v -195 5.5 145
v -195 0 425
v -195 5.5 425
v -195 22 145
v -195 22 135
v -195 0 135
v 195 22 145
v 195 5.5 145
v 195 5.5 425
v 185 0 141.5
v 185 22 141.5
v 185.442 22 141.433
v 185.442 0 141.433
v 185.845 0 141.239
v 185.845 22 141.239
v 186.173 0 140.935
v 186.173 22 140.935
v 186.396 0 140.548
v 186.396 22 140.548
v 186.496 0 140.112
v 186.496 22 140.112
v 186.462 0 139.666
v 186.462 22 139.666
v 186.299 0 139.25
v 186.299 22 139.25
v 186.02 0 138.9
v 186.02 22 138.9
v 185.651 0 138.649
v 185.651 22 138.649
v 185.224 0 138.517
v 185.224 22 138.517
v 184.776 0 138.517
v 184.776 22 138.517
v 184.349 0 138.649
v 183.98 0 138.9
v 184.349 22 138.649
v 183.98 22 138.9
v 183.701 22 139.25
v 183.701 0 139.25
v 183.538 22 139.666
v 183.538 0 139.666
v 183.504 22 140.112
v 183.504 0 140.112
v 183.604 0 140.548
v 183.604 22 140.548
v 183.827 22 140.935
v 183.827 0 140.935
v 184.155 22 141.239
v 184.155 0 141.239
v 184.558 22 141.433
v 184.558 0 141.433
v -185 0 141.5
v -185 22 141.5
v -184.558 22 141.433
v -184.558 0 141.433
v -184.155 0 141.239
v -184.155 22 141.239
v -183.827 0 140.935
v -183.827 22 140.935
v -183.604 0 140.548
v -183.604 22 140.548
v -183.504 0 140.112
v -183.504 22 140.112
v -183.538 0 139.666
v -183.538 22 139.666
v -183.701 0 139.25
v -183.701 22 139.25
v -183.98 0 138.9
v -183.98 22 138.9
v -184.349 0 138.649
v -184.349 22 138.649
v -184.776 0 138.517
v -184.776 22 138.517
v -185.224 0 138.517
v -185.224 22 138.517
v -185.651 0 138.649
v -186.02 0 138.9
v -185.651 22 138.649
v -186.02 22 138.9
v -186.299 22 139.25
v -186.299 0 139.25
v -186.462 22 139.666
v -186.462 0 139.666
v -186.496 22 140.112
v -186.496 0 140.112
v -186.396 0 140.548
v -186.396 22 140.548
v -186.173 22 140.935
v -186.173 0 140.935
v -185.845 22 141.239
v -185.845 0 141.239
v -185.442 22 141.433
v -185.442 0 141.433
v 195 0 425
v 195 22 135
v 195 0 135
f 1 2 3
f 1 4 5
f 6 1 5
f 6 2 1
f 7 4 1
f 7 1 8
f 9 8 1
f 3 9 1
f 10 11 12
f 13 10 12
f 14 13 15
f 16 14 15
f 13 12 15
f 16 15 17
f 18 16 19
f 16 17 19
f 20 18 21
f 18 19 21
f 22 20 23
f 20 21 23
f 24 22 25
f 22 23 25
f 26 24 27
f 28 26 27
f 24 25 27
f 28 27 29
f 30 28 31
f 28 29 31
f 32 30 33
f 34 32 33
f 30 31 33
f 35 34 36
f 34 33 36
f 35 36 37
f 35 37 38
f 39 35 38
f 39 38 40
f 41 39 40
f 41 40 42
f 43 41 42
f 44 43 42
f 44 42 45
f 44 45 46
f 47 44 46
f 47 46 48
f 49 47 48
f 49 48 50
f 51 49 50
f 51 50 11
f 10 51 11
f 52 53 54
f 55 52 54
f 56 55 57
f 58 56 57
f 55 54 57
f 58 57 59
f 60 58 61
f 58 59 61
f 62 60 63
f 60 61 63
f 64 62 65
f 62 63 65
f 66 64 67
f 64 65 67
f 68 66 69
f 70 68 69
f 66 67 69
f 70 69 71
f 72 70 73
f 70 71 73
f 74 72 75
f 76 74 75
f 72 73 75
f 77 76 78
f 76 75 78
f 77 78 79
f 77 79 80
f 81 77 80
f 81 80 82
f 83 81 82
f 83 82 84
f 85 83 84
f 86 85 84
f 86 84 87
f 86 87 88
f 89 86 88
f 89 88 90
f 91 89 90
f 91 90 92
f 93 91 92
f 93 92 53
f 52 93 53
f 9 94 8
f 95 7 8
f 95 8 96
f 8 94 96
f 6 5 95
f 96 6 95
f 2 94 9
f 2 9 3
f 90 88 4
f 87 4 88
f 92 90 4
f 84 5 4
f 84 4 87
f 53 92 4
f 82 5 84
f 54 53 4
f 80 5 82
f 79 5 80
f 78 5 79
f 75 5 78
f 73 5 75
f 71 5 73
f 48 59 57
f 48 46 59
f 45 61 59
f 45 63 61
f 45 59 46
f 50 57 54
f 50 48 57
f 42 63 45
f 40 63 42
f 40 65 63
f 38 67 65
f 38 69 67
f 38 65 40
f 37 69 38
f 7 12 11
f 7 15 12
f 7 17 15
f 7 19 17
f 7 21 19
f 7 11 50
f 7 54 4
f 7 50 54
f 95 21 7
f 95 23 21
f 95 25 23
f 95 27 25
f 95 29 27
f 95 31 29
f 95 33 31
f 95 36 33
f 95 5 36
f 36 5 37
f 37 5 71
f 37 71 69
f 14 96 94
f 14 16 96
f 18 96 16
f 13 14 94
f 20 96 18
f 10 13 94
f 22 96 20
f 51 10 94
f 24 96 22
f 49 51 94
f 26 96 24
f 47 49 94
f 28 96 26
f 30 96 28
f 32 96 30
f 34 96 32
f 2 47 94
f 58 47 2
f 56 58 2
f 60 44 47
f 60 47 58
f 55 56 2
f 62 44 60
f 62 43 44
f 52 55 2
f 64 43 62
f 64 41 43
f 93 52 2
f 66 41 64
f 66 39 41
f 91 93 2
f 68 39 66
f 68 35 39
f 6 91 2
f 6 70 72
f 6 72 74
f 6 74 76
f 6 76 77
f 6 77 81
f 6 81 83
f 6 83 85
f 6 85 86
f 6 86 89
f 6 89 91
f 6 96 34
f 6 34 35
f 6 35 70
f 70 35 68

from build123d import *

# Parameters (mm, degrees)
CROQUIS2_W                 = 390
CROQUIS2_H                 = 290
SALIENTE_EXTRUIR2_DEPTH    = 10
CROQUIS3_W                 = 390
CROQUIS3_H                 = 7
SALIENTE_EXTRUIR3_DEPTH    = 25
SALIENTE_EXTRUIR4_DEPTH    = 390
CORTAR_EXTRUIR1_DEPTH      = 180
CORTAR_EXTRUIR2_DEPTH      = 180
SALIENTE_EXTRUIR5_DEPTH    = 179
CROQUIS10_W                = 283
CROQUIS10_H                = 194.109962813
CORTAR_EXTRUIR5_DEPTH      = 236
CORTAR_EXTRUIR6_DEPTH      = 236
SALIENTE_EXTRUIR6_DEPTH    = 236
CROQUIS13_W                = 339.798946509
CROQUIS13_H                = 236.819651801
CROQUIS13_W_2              = 44.776464784
CROQUIS13_H_2              = 75.104657821
CORTAR_EXTRUIR7_DEPTH      = 500
CROQUIS14_W                = 59.446000687
CROQUIS14_H                = 81.435889979
CORTAR_EXTRUIR8_DEPTH      = 500
CROQUIS15_W                = 50
CROQUIS15_H                = 5
CORTAR_EXTRUIR9_DEPTH      = 500
CROQUIS16_W                = 390
CROQUIS16_H                = 283
CORTAR_EXTRUIR10_DEPTH     = 10
CROQUIS17_R                = 3.75
CORTAR_EXTRUIR11_DEPTH     = 10
CROQUIS18_R                = 3.75
CROQUIS18_R_2              = 1.5
SALIENTE_EXTRUIR8_DEPTH    = 4
CROQUIS19_R                = 1.5
SALIENTE_EXTRUIR10_DEPTH   = 15
CROQUIS20_R                = 1.5
SALIENTE_EXTRUIR11_DEPTH   = 15
SALIENTE_EXTRUIR11_2_DEPTH = 15
SALIENTE_EXTRUIR11_3_DEPTH = 15
CROQUIS21_W                = 390
CROQUIS21_H                = 283
SALIENTE_EXTRUIR12_DEPTH   = 10
CORTAR_EXTRUIR12_START     = -47
CROQUIS22_R                = 1.5
CORTAR_EXTRUIR12_DEPTH     = 47
CROQUIS26_W                = 283
CROQUIS26_H                = 4.5
CORTAR_EXTRUIR16_DEPTH     = 500
CROQUIS27_W                = 7
CROQUIS27_H                = 9.5
CORTAR_EXTRUIR17_DEPTH     = 500
CORTAR_EXTRUIR18_DEPTH     = 500
CROQUIS29_R                = 3.5
CORTAR_EXTRUIR19_DEPTH     = 20
CORTAR_EXTRUIR20_DEPTH     = 314
CROQUIS32_R                = 3.5
CORTAR_EXTRUIR21_DEPTH     = 25
CROQUIS33_W                = 308.833685193
CROQUIS33_H                = 37.038834889
CORTAR_EXTRUIR22_DEPTH     = 500
CROQUIS34_W                = 390
CROQUIS34_H                = 290
CROQUIS34_R                = 1.5
SALIENTE_EXTRUIR14_DEPTH   = 5.5
CROQUIS35_W                = 390
CROQUIS35_H                = 10
SALIENTE_EXTRUIR15_DEPTH   = 22
CORTAR_EXTRUIR23_DEPTH     = 488
CORTAR_EXTRUIR28_DEPTH     = 479.5
CROQUIS38_R                = 3.5
CORTAR_EXTRUIR29_DEPTH     = 25
CROQUIS39_R                = 1.5
SALIENTE_EXTRUIR16_DEPTH   = 9
CROQUIS40_R                = 3.5
SALIENTE_EXTRUIR17_DEPTH   = 25
CROQUIS41_R                = 3.5
CORTAR_EXTRUIR30_DEPTH     = 25
CROQUIS43_W                = 307.128340428
CROQUIS43_H                = 102.232085181
CORTAR_EXTRUIR32_DEPTH     = 500
CROQUIS44_R                = 1.5
CORTAR_EXTRUIR34_DEPTH     = 50
CROQUIS45_W                = 390
CROQUIS45_H                = 290
CORTAR_EXTRUIR37_DEPTH     = 50
SALIENTE_EXTRUIR19_START   = 16.5
CROQUIS46_W                = 390
CROQUIS46_H                = 10
CROQUIS46_R                = 1.5
SALIENTE_EXTRUIR19_DEPTH   = 16.5
CROQUIS48_W                = 390
CROQUIS48_H                = 280
CORTAR_EXTRUIR38_DEPTH     = 16.5
CROQUIS49_W                = 390
CROQUIS49_H                = 280
SALIENTE_EXTRUIR20_DEPTH   = 5.5


with BuildPart() as part:
    # Croquis2 → Saliente-Extruir2 (new body)
    with BuildSketch(Plane(origin=(0, 0, 0), x_dir=(1, 0, 0), z_dir=(0, 1, 0))):
        Rectangle(CROQUIS2_W, CROQUIS2_H)
    extrude(amount=SALIENTE_EXTRUIR2_DEPTH)

    # Croquis3 → Saliente-Extruir3 (add)
    with BuildSketch(Plane(origin=(0, 10, 0), x_dir=(1, 0, 0), z_dir=(0, 1, 0))):
        with Locations((0, -141.5)):
            Rectangle(CROQUIS3_W, CROQUIS3_H)
    extrude(amount=SALIENTE_EXTRUIR3_DEPTH)

    # Croquis5 → Saliente-Extruir4 (add)
    with BuildSketch(Plane.ZY.offset(195)):
        Polygon((145, 0), (51.120689647, -135.689627782), (-145, 0), align=None)
    extrude(amount=-SALIENTE_EXTRUIR4_DEPTH)

    # Croquis6 → Cortar-Extruir1 (cut)
    with BuildSketch(Plane.ZY.offset(195)):
        Polygon((-145, 0), (145, 0), (51.120689647, -135.689627782), align=None)
    extrude(amount=-CORTAR_EXTRUIR1_DEPTH, mode=Mode.SUBTRACT)

    # Croquis7 → Cortar-Extruir2 (cut)
    with BuildSketch(Plane(origin=(195, 0, 0), x_dir=(0, 0, -1), z_dir=(1, 0, 0))):
        Polygon((145, 0), (-145, 0), (-51.120689647, -135.689627782), align=None)
    extrude(amount=-CORTAR_EXTRUIR2_DEPTH, mode=Mode.SUBTRACT)

    # Croquis8 → Saliente-Extruir5 (add)
    with BuildSketch(Plane(origin=(0, -67.844813894, -46.939655172), x_dir=(-1, 0, 0), z_dir=(0, -0.8223613805318496, -0.5689655172413796))):
        Polygon((15, -119.242400168), (105, 119.242400177), (75, 119.242400177), (15, -39.747466719), align=None)
    extrude(amount=-SALIENTE_EXTRUIR5_DEPTH)

    # Croquis10 → Cortar-Extruir5 (cut)
    with BuildSketch(Plane.ZY.offset(195)):
        with Locations((-3.5, 107.054981407)):
            Rectangle(CROQUIS10_W, CROQUIS10_H)
    extrude(amount=-CORTAR_EXTRUIR5_DEPTH, mode=Mode.SUBTRACT)

    # Croquis11 → Cortar-Extruir6 (cut)
    with BuildSketch(Plane.ZY.offset(195)):
        Polygon((145, 17.024145748), (144.999999988, 0), (165.789590248, 1.603195777), (161.358166331, 19.30887792), align=None)
    extrude(amount=-CORTAR_EXTRUIR6_DEPTH, mode=Mode.SUBTRACT)

    # Croquis12 → Saliente-Extruir6 (add)
    with BuildSketch(Plane(origin=(0, -67.844813894, -46.939655172), x_dir=(-1, 0, 0), z_dir=(0, -0.8223613805318496, -0.5689655172413796))):
        Polygon((-15, -119.242400168), (-105, 119.242400177), (-75, 119.242400177), (-15, -39.747466719), align=None)
    extrude(amount=-SALIENTE_EXTRUIR6_DEPTH)

    # Croquis13 → Cortar-Extruir7 (cut)
    with BuildSketch(Plane(origin=(195, 0, 0), x_dir=(0, 0, -1), z_dir=(1, 0, 0))):
        with Locations((31.899473255, 128.409825901)):
            Rectangle(CROQUIS13_W, CROQUIS13_H)
        with Locations((-167.388232392, 37.552328911)):
            Rectangle(CROQUIS13_W_2, CROQUIS13_H_2)
    extrude(amount=-CORTAR_EXTRUIR7_DEPTH, mode=Mode.SUBTRACT)

    # Croquis14 → Cortar-Extruir8 (cut)
    with BuildSketch(Plane(origin=(195, 0, 0), x_dir=(0, 0, -1), z_dir=(1, 0, 0))):
        with Locations((-167.723000344, 75.71794499)):
            Rectangle(CROQUIS14_W, CROQUIS14_H)
    extrude(amount=-CORTAR_EXTRUIR8_DEPTH, mode=Mode.SUBTRACT)

    # Croquis15 → Cortar-Extruir9 (cut)
    with BuildSketch(Plane.ZY.offset(195)):
        with Locations((-102, -2.5)):
            Rectangle(CROQUIS15_W, CROQUIS15_H)
    extrude(amount=-CORTAR_EXTRUIR9_DEPTH, mode=Mode.SUBTRACT)

    # Croquis16 → Cortar-Extruir10 (cut)
    with BuildSketch(Plane(origin=(0, 10, 0), x_dir=(1, 0, 0), z_dir=(0, 1, 0))):
        with Locations((0, 3.5)):
            Rectangle(CROQUIS16_W, CROQUIS16_H)
    extrude(amount=-CORTAR_EXTRUIR10_DEPTH, mode=Mode.SUBTRACT)

    # Croquis17 → Cortar-Extruir11 (cut)
    with BuildSketch(Plane(origin=(0, 0, 0), x_dir=(1, 0, 0), z_dir=(0, 1, 0))):
        with Locations(Location((-87.205, 136, 0), (0, 0, 270))):
            Circle(CROQUIS17_R)
        with Locations(Location((0, 136, 0), (0, 0, 270))):
            Circle(CROQUIS17_R)
        with Locations(Location((87.205, 136, 0), (0, 0, 270))):
            Circle(CROQUIS17_R)
    extrude(amount=-CORTAR_EXTRUIR11_DEPTH, mode=Mode.SUBTRACT)

    # Croquis18 → Saliente-Extruir8 (add)
    # profile 1 of 3: a face of its own
    with BuildSketch(Plane(origin=(0, 0, 0), x_dir=(1, 0, 0), z_dir=(0, 1, 0))):
        with Locations((-87.205, 136)):
            Circle(CROQUIS18_R)
        with Locations(Location((-87.205, 136, 0), (0, 0, 270))):
            Circle(CROQUIS18_R_2, mode=Mode.SUBTRACT)
    # profile 2 of 3: a face of its own
    with BuildSketch(Plane(origin=(0, 0, 0), x_dir=(1, 0, 0), z_dir=(0, 1, 0))):
        with Locations((0, 136)):
            Circle(CROQUIS18_R)
        with Locations(Location((0, 136, 0), (0, 0, 270))):
            Circle(CROQUIS18_R_2, mode=Mode.SUBTRACT)
    # profile 3 of 3: a face of its own
    with BuildSketch(Plane(origin=(0, 0, 0), x_dir=(1, 0, 0), z_dir=(0, 1, 0))):
        with Locations((87.205, 136)):
            Circle(CROQUIS18_R)
        with Locations(Location((87.205, 136, 0), (0, 0, 270))):
            Circle(CROQUIS18_R_2, mode=Mode.SUBTRACT)
    extrude(amount=-SALIENTE_EXTRUIR8_DEPTH)

    # Croquis19 → Saliente-Extruir10 (add)
    with BuildSketch(Plane(origin=(0, 0, 0), x_dir=(1, 0, 0), z_dir=(0, 1, 0))):
        with Locations(Location((-52.533337706, 22, 0), (0, 0, 270))):
            Circle(CROQUIS19_R)
        with Locations(Location((0, 22, 0), (0, 0, 270))):
            Circle(CROQUIS19_R)
        with Locations(Location((52.533337706, 22, 0), (0, 0, 270))):
            Circle(CROQUIS19_R)
        with Locations(Location((0, -58, 0), (0, 0, 270))):
            Circle(CROQUIS19_R)
        with Locations(Location((0, -116, 0), (0, 0, 270))):
            Circle(CROQUIS19_R)
    extrude(amount=SALIENTE_EXTRUIR10_DEPTH)



with BuildPart() as body_2:
    # Croquis20 → Saliente-Extruir11 (new body)
    with BuildSketch(Plane(origin=(0, 0, 0), x_dir=(1, 0, 0), z_dir=(0, 1, 0))):
        with Locations(Location((-87.205, 136, 0), (0, 0, 270))):
            Circle(CROQUIS20_R)
    extrude(amount=SALIENTE_EXTRUIR11_DEPTH)


with BuildPart() as body_3:
    # Croquis20 → Saliente-Extruir11 2 (new body)
    with BuildSketch(Plane(origin=(0, 0, 0), x_dir=(1, 0, 0), z_dir=(0, 1, 0))):
        with Locations(Location((0, 136, 0), (0, 0, 270))):
            Circle(CROQUIS20_R)
    extrude(amount=SALIENTE_EXTRUIR11_2_DEPTH)


with BuildPart() as body_4:
    # Croquis20 → Saliente-Extruir11 3 (new body)
    with BuildSketch(Plane(origin=(0, 0, 0), x_dir=(1, 0, 0), z_dir=(0, 1, 0))):
        with Locations(Location((87.205, 136, 0), (0, 0, 270))):
            Circle(CROQUIS20_R)
    extrude(amount=SALIENTE_EXTRUIR11_3_DEPTH)


with BuildPart() as part_1:
    add(part.part)

    add(body_2.part)  # Saliente-Extruir12 merges body 2

    add(body_3.part)  # Saliente-Extruir12 merges body 3

    add(body_4.part)  # Saliente-Extruir12 merges body 4
    # Croquis21 → Saliente-Extruir12 (add)
    with BuildSketch(Plane(origin=(0, 0, 0), x_dir=(1, 0, 0), z_dir=(0, 1, 0))):
        with Locations((0, 3.5)):
            Rectangle(CROQUIS21_W, CROQUIS21_H)
    extrude(amount=SALIENTE_EXTRUIR12_DEPTH)

    # Croquis22 → Cortar-Extruir12 (cut)
    with BuildSketch(Plane(origin=(0, 15, 0), x_dir=(1, 0, 0), z_dir=(0, 1, 0)).offset(CORTAR_EXTRUIR12_START)):
        with Locations(Location((0, -116, 0), (0, 0, 270))):
            Circle(CROQUIS22_R)
        with Locations(Location((0, -58, 0), (0, 0, 270))):
            Circle(CROQUIS22_R)
        with Locations(Location((-52.533337706, 22, 0), (0, 0, 270))):
            Circle(CROQUIS22_R)
        with Locations(Location((0, 22, 0), (0, 0, 270))):
            Circle(CROQUIS22_R)
        with Locations(Location((52.533337706, 22, 0), (0, 0, 270))):
            Circle(CROQUIS22_R)
        with Locations(Location((87.205, 136, 0), (0, 0, 270))):
            Circle(CROQUIS22_R)
        with Locations(Location((0, 136, 0), (0, 0, 270))):
            Circle(CROQUIS22_R)
        with Locations(Location((-87.205, 136, 0), (0, 0, 270))):
            Circle(CROQUIS22_R)
    extrude(amount=CORTAR_EXTRUIR12_DEPTH, mode=Mode.SUBTRACT)

    # Croquis26 → Cortar-Extruir16 (cut)
    with BuildSketch(Plane.ZY.offset(195)):
        with Locations((-3.5, 7.75)):
            Rectangle(CROQUIS26_W, CROQUIS26_H)
    extrude(amount=-CORTAR_EXTRUIR16_DEPTH, mode=Mode.SUBTRACT)

    # Croquis27 → Cortar-Extruir17 (cut)
    with BuildSketch(Plane.ZY.offset(195)):
        with Locations((141.5, 30.25)):
            Rectangle(CROQUIS27_W, CROQUIS27_H)
    extrude(amount=-CORTAR_EXTRUIR17_DEPTH, mode=Mode.SUBTRACT)

    # Croquis28 → Cortar-Extruir18 (cut)
    with BuildSketch(Plane.ZY.offset(195)):
        Polygon((51.120689647, -135.689627782), (80.706896544, -92.926835995), (49.045983393, -71.021663581), (19.459776497, -113.784455368), align=None)
    extrude(amount=-CORTAR_EXTRUIR18_DEPTH, mode=Mode.SUBTRACT)

    # Croquis29 → Cortar-Extruir19 (cut)
    with BuildSketch(Plane(origin=(0, -25.082022106, -17.353448276), x_dir=(-1, 0, 0), z_dir=(0, -0.8223613805318496, -0.5689655172413796))):
        with Locations(Location((0, -91.242400168, 0), (0, 0, 90))):
            Circle(CROQUIS29_R)
    extrude(amount=-CORTAR_EXTRUIR19_DEPTH, mode=Mode.SUBTRACT)

    # Croquis31 → Cortar-Extruir20 (cut)
    with BuildSketch(Plane(origin=(195, 0, 0), x_dir=(0, 0, -1), z_dir=(1, 0, 0))):
        Polygon((-71.450630314, -70.714586325), (-76.002354452, -64.13569528), (-63.255753053, -55.316729763), (-58.704028915, -61.895620807), align=None)
    extrude(amount=-CORTAR_EXTRUIR20_DEPTH, mode=Mode.SUBTRACT)

    # Croquis32 → Cortar-Extruir21 (cut)
    with BuildSketch(Plane(origin=(0, -67.844813897, 98.06034482), x_dir=(1, 0, 0), z_dir=(0, -0.568965517289267, 0.8223613804987178))):
        with Locations(Location((0, 47.5, 0), (0, 0, 270))):
            Circle(CROQUIS32_R)
    extrude(amount=-CORTAR_EXTRUIR21_DEPTH, mode=Mode.SUBTRACT)

    # Croquis33 → Cortar-Extruir22 (cut)
    with BuildSketch(Plane(origin=(195, 0, 0), x_dir=(0, 0, -1), z_dir=(1, 0, 0))):
        with Locations((9.416842597, 18.519417445)):
            Rectangle(CROQUIS33_W, CROQUIS33_H)
    extrude(amount=-CORTAR_EXTRUIR22_DEPTH, mode=Mode.SUBTRACT)

    # Croquis34 → Saliente-Extruir14 (add)
    with BuildSketch(Plane(origin=(0, 0, 0), x_dir=(1, 0, 0), z_dir=(0, 1, 0))):
        Rectangle(CROQUIS34_W, CROQUIS34_H)
        with Locations(Location((0, -58, 0), (0, 0, 270))):
            Circle(CROQUIS34_R, mode=Mode.SUBTRACT)
        with Locations(Location((0, -116, 0), (0, 0, 270))):
            Circle(CROQUIS34_R, mode=Mode.SUBTRACT)
        with Locations(Location((-52.533337706, 22, 0), (0, 0, 270))):
            Circle(CROQUIS34_R, mode=Mode.SUBTRACT)
        with Locations(Location((0, 22, 0), (0, 0, 270))):
            Circle(CROQUIS34_R, mode=Mode.SUBTRACT)
        with Locations(Location((52.533337706, 22, 0), (0, 0, 270))):
            Circle(CROQUIS34_R, mode=Mode.SUBTRACT)
        with Locations(Location((-87.205, 136, 0), (0, 0, 270))):
            Circle(CROQUIS34_R, mode=Mode.SUBTRACT)
        with Locations(Location((0, 136, 0), (0, 0, 270))):
            Circle(CROQUIS34_R, mode=Mode.SUBTRACT)
        with Locations(Location((87.205, 136, 0), (0, 0, 270))):
            Circle(CROQUIS34_R, mode=Mode.SUBTRACT)
    extrude(amount=SALIENTE_EXTRUIR14_DEPTH)

    # Croquis35 → Saliente-Extruir15 (add)
    with BuildSketch(Plane(origin=(0, 5.5, 0), x_dir=(1, 0, 0), z_dir=(0, 1, 0))):
        with Locations((0, -140)):
            Rectangle(CROQUIS35_W, CROQUIS35_H)
    extrude(amount=SALIENTE_EXTRUIR15_DEPTH)

    # Croquis36 → Cortar-Extruir23 (cut)
    with BuildSketch(Plane.ZY.offset(195)):
        Polygon((19.459776497, -113.784455368), (-123.319563604, -15), (49.045983393, -71.021663581), align=None)
    extrude(amount=-CORTAR_EXTRUIR23_DEPTH, mode=Mode.SUBTRACT)

    # Croquis37 → Cortar-Extruir28 (cut)
    with BuildSketch(Plane.ZY.offset(195)):
        with BuildLine():
            Line((-115.772134461, -17.453039739), (39.045983393, -17.453039739))
            ThreePointArc((39.045983393, -17.453039739), (46.117051205, -20.381971927), (49.045983393, -27.453039739))
            Line((49.045983393, -27.453039739), (49.045983393, -71.021663581))
            Line((49.045983393, -71.021663581), (-115.772134461, -17.453039739))
        make_face()
    extrude(amount=-CORTAR_EXTRUIR28_DEPTH, mode=Mode.SUBTRACT)

    # Croquis38 → Cortar-Extruir29 (cut)
    with BuildSketch(Plane(origin=(0, -67.844813897, 98.06034482), x_dir=(1, 0, 0), z_dir=(0, -0.568965517289267, 0.8223613804987178))):
        with Locations((0, 44.5)):
            Circle(CROQUIS38_R)
    extrude(amount=-CORTAR_EXTRUIR29_DEPTH, mode=Mode.SUBTRACT)

    # Croquis39 → Saliente-Extruir16 (add)
    with BuildSketch(Plane(origin=(0, -32, 0), x_dir=(1, 0, 0), z_dir=(0, 1, 0))):
        with Locations(Location((0, -116, 0), (0, 0, 270))):
            Circle(CROQUIS39_R)
    extrude(amount=SALIENTE_EXTRUIR16_DEPTH)

    # Croquis40 → Saliente-Extruir17 (add)
    with BuildSketch(Plane(origin=(0, -67.844813897, 98.06034482), x_dir=(1, 0, 0), z_dir=(0, -0.568965517289267, 0.8223613804987178))):
        with Locations((0, 47.5)):
            Circle(CROQUIS40_R)
    extrude(amount=-SALIENTE_EXTRUIR17_DEPTH)

    # Croquis41 → Cortar-Extruir30 (cut)
    with BuildSketch(Plane(origin=(0, -67.844813897, 98.06034482), x_dir=(1, 0, 0), z_dir=(0, -0.568965517289267, 0.8223613804987178))):
        with Locations(Location((0, 44.5, 0), (0, 0, 270))):
            Circle(CROQUIS41_R)
    extrude(amount=-CORTAR_EXTRUIR30_DEPTH, mode=Mode.SUBTRACT)

    # Croquis43 → Cortar-Extruir32 (cut)
    with BuildSketch(Plane.ZY.offset(195)):
        with Locations((8.564170214, -51.116042591)):
            Rectangle(CROQUIS43_W, CROQUIS43_H)
    extrude(amount=-CORTAR_EXTRUIR32_DEPTH, mode=Mode.SUBTRACT)

    # Croquis44 → Cortar-Extruir34 (cut)
    with BuildSketch(Plane(origin=(0, 27.5, 0), x_dir=(1, 0, 0), z_dir=(0, 1, 0))):
        with Locations(Location((-185, -140, 0), (0, 0, 270))):
            Circle(CROQUIS44_R)
        with Locations(Location((185, -140, 0), (0, 0, 270))):
            Circle(CROQUIS44_R)
    extrude(amount=-CORTAR_EXTRUIR34_DEPTH, mode=Mode.SUBTRACT)

    # Croquis45 → Cortar-Extruir37 (cut)
    with BuildSketch(Plane(origin=(0, 5.5, 0), x_dir=(1, 0, 0), z_dir=(0, 1, 0))):
        Rectangle(CROQUIS45_W, CROQUIS45_H)
    extrude(amount=CORTAR_EXTRUIR37_DEPTH, mode=Mode.SUBTRACT)

    # Croquis46 → Saliente-Extruir19 (add)
    with BuildSketch(Plane(origin=(0, 5.5, 0), x_dir=(1, 0, 0), z_dir=(0, 1, 0)).offset(SALIENTE_EXTRUIR19_START)):
        with Locations((0, -140)):
            Rectangle(CROQUIS46_W, CROQUIS46_H)
        with Locations(Location((-185, -140, 0), (0, 0, 270))):
            Circle(CROQUIS46_R, mode=Mode.SUBTRACT)
        with Locations(Location((185, -140, 0), (0, 0, 270))):
            Circle(CROQUIS46_R, mode=Mode.SUBTRACT)
    extrude(amount=-SALIENTE_EXTRUIR19_DEPTH)

    # Croquis48 → Cortar-Extruir38 (cut)
    with BuildSketch(Plane(origin=(0, 5.5, 0), x_dir=(1, 0, 0), z_dir=(0, 1, 0))):
        with Locations((0, 5)):
            Rectangle(CROQUIS48_W, CROQUIS48_H)
    extrude(amount=-CORTAR_EXTRUIR38_DEPTH, mode=Mode.SUBTRACT)

    # Croquis49 → Saliente-Extruir20 (add)
    with BuildSketch(Plane(origin=(0, 0, 0), x_dir=(-1, 0, 0), z_dir=(0, -1, 0))):
        with Locations((0, -285)):
            Rectangle(CROQUIS49_W, CROQUIS49_H)
    extrude(amount=-SALIENTE_EXTRUIR20_DEPTH)


solid = part_1.part
